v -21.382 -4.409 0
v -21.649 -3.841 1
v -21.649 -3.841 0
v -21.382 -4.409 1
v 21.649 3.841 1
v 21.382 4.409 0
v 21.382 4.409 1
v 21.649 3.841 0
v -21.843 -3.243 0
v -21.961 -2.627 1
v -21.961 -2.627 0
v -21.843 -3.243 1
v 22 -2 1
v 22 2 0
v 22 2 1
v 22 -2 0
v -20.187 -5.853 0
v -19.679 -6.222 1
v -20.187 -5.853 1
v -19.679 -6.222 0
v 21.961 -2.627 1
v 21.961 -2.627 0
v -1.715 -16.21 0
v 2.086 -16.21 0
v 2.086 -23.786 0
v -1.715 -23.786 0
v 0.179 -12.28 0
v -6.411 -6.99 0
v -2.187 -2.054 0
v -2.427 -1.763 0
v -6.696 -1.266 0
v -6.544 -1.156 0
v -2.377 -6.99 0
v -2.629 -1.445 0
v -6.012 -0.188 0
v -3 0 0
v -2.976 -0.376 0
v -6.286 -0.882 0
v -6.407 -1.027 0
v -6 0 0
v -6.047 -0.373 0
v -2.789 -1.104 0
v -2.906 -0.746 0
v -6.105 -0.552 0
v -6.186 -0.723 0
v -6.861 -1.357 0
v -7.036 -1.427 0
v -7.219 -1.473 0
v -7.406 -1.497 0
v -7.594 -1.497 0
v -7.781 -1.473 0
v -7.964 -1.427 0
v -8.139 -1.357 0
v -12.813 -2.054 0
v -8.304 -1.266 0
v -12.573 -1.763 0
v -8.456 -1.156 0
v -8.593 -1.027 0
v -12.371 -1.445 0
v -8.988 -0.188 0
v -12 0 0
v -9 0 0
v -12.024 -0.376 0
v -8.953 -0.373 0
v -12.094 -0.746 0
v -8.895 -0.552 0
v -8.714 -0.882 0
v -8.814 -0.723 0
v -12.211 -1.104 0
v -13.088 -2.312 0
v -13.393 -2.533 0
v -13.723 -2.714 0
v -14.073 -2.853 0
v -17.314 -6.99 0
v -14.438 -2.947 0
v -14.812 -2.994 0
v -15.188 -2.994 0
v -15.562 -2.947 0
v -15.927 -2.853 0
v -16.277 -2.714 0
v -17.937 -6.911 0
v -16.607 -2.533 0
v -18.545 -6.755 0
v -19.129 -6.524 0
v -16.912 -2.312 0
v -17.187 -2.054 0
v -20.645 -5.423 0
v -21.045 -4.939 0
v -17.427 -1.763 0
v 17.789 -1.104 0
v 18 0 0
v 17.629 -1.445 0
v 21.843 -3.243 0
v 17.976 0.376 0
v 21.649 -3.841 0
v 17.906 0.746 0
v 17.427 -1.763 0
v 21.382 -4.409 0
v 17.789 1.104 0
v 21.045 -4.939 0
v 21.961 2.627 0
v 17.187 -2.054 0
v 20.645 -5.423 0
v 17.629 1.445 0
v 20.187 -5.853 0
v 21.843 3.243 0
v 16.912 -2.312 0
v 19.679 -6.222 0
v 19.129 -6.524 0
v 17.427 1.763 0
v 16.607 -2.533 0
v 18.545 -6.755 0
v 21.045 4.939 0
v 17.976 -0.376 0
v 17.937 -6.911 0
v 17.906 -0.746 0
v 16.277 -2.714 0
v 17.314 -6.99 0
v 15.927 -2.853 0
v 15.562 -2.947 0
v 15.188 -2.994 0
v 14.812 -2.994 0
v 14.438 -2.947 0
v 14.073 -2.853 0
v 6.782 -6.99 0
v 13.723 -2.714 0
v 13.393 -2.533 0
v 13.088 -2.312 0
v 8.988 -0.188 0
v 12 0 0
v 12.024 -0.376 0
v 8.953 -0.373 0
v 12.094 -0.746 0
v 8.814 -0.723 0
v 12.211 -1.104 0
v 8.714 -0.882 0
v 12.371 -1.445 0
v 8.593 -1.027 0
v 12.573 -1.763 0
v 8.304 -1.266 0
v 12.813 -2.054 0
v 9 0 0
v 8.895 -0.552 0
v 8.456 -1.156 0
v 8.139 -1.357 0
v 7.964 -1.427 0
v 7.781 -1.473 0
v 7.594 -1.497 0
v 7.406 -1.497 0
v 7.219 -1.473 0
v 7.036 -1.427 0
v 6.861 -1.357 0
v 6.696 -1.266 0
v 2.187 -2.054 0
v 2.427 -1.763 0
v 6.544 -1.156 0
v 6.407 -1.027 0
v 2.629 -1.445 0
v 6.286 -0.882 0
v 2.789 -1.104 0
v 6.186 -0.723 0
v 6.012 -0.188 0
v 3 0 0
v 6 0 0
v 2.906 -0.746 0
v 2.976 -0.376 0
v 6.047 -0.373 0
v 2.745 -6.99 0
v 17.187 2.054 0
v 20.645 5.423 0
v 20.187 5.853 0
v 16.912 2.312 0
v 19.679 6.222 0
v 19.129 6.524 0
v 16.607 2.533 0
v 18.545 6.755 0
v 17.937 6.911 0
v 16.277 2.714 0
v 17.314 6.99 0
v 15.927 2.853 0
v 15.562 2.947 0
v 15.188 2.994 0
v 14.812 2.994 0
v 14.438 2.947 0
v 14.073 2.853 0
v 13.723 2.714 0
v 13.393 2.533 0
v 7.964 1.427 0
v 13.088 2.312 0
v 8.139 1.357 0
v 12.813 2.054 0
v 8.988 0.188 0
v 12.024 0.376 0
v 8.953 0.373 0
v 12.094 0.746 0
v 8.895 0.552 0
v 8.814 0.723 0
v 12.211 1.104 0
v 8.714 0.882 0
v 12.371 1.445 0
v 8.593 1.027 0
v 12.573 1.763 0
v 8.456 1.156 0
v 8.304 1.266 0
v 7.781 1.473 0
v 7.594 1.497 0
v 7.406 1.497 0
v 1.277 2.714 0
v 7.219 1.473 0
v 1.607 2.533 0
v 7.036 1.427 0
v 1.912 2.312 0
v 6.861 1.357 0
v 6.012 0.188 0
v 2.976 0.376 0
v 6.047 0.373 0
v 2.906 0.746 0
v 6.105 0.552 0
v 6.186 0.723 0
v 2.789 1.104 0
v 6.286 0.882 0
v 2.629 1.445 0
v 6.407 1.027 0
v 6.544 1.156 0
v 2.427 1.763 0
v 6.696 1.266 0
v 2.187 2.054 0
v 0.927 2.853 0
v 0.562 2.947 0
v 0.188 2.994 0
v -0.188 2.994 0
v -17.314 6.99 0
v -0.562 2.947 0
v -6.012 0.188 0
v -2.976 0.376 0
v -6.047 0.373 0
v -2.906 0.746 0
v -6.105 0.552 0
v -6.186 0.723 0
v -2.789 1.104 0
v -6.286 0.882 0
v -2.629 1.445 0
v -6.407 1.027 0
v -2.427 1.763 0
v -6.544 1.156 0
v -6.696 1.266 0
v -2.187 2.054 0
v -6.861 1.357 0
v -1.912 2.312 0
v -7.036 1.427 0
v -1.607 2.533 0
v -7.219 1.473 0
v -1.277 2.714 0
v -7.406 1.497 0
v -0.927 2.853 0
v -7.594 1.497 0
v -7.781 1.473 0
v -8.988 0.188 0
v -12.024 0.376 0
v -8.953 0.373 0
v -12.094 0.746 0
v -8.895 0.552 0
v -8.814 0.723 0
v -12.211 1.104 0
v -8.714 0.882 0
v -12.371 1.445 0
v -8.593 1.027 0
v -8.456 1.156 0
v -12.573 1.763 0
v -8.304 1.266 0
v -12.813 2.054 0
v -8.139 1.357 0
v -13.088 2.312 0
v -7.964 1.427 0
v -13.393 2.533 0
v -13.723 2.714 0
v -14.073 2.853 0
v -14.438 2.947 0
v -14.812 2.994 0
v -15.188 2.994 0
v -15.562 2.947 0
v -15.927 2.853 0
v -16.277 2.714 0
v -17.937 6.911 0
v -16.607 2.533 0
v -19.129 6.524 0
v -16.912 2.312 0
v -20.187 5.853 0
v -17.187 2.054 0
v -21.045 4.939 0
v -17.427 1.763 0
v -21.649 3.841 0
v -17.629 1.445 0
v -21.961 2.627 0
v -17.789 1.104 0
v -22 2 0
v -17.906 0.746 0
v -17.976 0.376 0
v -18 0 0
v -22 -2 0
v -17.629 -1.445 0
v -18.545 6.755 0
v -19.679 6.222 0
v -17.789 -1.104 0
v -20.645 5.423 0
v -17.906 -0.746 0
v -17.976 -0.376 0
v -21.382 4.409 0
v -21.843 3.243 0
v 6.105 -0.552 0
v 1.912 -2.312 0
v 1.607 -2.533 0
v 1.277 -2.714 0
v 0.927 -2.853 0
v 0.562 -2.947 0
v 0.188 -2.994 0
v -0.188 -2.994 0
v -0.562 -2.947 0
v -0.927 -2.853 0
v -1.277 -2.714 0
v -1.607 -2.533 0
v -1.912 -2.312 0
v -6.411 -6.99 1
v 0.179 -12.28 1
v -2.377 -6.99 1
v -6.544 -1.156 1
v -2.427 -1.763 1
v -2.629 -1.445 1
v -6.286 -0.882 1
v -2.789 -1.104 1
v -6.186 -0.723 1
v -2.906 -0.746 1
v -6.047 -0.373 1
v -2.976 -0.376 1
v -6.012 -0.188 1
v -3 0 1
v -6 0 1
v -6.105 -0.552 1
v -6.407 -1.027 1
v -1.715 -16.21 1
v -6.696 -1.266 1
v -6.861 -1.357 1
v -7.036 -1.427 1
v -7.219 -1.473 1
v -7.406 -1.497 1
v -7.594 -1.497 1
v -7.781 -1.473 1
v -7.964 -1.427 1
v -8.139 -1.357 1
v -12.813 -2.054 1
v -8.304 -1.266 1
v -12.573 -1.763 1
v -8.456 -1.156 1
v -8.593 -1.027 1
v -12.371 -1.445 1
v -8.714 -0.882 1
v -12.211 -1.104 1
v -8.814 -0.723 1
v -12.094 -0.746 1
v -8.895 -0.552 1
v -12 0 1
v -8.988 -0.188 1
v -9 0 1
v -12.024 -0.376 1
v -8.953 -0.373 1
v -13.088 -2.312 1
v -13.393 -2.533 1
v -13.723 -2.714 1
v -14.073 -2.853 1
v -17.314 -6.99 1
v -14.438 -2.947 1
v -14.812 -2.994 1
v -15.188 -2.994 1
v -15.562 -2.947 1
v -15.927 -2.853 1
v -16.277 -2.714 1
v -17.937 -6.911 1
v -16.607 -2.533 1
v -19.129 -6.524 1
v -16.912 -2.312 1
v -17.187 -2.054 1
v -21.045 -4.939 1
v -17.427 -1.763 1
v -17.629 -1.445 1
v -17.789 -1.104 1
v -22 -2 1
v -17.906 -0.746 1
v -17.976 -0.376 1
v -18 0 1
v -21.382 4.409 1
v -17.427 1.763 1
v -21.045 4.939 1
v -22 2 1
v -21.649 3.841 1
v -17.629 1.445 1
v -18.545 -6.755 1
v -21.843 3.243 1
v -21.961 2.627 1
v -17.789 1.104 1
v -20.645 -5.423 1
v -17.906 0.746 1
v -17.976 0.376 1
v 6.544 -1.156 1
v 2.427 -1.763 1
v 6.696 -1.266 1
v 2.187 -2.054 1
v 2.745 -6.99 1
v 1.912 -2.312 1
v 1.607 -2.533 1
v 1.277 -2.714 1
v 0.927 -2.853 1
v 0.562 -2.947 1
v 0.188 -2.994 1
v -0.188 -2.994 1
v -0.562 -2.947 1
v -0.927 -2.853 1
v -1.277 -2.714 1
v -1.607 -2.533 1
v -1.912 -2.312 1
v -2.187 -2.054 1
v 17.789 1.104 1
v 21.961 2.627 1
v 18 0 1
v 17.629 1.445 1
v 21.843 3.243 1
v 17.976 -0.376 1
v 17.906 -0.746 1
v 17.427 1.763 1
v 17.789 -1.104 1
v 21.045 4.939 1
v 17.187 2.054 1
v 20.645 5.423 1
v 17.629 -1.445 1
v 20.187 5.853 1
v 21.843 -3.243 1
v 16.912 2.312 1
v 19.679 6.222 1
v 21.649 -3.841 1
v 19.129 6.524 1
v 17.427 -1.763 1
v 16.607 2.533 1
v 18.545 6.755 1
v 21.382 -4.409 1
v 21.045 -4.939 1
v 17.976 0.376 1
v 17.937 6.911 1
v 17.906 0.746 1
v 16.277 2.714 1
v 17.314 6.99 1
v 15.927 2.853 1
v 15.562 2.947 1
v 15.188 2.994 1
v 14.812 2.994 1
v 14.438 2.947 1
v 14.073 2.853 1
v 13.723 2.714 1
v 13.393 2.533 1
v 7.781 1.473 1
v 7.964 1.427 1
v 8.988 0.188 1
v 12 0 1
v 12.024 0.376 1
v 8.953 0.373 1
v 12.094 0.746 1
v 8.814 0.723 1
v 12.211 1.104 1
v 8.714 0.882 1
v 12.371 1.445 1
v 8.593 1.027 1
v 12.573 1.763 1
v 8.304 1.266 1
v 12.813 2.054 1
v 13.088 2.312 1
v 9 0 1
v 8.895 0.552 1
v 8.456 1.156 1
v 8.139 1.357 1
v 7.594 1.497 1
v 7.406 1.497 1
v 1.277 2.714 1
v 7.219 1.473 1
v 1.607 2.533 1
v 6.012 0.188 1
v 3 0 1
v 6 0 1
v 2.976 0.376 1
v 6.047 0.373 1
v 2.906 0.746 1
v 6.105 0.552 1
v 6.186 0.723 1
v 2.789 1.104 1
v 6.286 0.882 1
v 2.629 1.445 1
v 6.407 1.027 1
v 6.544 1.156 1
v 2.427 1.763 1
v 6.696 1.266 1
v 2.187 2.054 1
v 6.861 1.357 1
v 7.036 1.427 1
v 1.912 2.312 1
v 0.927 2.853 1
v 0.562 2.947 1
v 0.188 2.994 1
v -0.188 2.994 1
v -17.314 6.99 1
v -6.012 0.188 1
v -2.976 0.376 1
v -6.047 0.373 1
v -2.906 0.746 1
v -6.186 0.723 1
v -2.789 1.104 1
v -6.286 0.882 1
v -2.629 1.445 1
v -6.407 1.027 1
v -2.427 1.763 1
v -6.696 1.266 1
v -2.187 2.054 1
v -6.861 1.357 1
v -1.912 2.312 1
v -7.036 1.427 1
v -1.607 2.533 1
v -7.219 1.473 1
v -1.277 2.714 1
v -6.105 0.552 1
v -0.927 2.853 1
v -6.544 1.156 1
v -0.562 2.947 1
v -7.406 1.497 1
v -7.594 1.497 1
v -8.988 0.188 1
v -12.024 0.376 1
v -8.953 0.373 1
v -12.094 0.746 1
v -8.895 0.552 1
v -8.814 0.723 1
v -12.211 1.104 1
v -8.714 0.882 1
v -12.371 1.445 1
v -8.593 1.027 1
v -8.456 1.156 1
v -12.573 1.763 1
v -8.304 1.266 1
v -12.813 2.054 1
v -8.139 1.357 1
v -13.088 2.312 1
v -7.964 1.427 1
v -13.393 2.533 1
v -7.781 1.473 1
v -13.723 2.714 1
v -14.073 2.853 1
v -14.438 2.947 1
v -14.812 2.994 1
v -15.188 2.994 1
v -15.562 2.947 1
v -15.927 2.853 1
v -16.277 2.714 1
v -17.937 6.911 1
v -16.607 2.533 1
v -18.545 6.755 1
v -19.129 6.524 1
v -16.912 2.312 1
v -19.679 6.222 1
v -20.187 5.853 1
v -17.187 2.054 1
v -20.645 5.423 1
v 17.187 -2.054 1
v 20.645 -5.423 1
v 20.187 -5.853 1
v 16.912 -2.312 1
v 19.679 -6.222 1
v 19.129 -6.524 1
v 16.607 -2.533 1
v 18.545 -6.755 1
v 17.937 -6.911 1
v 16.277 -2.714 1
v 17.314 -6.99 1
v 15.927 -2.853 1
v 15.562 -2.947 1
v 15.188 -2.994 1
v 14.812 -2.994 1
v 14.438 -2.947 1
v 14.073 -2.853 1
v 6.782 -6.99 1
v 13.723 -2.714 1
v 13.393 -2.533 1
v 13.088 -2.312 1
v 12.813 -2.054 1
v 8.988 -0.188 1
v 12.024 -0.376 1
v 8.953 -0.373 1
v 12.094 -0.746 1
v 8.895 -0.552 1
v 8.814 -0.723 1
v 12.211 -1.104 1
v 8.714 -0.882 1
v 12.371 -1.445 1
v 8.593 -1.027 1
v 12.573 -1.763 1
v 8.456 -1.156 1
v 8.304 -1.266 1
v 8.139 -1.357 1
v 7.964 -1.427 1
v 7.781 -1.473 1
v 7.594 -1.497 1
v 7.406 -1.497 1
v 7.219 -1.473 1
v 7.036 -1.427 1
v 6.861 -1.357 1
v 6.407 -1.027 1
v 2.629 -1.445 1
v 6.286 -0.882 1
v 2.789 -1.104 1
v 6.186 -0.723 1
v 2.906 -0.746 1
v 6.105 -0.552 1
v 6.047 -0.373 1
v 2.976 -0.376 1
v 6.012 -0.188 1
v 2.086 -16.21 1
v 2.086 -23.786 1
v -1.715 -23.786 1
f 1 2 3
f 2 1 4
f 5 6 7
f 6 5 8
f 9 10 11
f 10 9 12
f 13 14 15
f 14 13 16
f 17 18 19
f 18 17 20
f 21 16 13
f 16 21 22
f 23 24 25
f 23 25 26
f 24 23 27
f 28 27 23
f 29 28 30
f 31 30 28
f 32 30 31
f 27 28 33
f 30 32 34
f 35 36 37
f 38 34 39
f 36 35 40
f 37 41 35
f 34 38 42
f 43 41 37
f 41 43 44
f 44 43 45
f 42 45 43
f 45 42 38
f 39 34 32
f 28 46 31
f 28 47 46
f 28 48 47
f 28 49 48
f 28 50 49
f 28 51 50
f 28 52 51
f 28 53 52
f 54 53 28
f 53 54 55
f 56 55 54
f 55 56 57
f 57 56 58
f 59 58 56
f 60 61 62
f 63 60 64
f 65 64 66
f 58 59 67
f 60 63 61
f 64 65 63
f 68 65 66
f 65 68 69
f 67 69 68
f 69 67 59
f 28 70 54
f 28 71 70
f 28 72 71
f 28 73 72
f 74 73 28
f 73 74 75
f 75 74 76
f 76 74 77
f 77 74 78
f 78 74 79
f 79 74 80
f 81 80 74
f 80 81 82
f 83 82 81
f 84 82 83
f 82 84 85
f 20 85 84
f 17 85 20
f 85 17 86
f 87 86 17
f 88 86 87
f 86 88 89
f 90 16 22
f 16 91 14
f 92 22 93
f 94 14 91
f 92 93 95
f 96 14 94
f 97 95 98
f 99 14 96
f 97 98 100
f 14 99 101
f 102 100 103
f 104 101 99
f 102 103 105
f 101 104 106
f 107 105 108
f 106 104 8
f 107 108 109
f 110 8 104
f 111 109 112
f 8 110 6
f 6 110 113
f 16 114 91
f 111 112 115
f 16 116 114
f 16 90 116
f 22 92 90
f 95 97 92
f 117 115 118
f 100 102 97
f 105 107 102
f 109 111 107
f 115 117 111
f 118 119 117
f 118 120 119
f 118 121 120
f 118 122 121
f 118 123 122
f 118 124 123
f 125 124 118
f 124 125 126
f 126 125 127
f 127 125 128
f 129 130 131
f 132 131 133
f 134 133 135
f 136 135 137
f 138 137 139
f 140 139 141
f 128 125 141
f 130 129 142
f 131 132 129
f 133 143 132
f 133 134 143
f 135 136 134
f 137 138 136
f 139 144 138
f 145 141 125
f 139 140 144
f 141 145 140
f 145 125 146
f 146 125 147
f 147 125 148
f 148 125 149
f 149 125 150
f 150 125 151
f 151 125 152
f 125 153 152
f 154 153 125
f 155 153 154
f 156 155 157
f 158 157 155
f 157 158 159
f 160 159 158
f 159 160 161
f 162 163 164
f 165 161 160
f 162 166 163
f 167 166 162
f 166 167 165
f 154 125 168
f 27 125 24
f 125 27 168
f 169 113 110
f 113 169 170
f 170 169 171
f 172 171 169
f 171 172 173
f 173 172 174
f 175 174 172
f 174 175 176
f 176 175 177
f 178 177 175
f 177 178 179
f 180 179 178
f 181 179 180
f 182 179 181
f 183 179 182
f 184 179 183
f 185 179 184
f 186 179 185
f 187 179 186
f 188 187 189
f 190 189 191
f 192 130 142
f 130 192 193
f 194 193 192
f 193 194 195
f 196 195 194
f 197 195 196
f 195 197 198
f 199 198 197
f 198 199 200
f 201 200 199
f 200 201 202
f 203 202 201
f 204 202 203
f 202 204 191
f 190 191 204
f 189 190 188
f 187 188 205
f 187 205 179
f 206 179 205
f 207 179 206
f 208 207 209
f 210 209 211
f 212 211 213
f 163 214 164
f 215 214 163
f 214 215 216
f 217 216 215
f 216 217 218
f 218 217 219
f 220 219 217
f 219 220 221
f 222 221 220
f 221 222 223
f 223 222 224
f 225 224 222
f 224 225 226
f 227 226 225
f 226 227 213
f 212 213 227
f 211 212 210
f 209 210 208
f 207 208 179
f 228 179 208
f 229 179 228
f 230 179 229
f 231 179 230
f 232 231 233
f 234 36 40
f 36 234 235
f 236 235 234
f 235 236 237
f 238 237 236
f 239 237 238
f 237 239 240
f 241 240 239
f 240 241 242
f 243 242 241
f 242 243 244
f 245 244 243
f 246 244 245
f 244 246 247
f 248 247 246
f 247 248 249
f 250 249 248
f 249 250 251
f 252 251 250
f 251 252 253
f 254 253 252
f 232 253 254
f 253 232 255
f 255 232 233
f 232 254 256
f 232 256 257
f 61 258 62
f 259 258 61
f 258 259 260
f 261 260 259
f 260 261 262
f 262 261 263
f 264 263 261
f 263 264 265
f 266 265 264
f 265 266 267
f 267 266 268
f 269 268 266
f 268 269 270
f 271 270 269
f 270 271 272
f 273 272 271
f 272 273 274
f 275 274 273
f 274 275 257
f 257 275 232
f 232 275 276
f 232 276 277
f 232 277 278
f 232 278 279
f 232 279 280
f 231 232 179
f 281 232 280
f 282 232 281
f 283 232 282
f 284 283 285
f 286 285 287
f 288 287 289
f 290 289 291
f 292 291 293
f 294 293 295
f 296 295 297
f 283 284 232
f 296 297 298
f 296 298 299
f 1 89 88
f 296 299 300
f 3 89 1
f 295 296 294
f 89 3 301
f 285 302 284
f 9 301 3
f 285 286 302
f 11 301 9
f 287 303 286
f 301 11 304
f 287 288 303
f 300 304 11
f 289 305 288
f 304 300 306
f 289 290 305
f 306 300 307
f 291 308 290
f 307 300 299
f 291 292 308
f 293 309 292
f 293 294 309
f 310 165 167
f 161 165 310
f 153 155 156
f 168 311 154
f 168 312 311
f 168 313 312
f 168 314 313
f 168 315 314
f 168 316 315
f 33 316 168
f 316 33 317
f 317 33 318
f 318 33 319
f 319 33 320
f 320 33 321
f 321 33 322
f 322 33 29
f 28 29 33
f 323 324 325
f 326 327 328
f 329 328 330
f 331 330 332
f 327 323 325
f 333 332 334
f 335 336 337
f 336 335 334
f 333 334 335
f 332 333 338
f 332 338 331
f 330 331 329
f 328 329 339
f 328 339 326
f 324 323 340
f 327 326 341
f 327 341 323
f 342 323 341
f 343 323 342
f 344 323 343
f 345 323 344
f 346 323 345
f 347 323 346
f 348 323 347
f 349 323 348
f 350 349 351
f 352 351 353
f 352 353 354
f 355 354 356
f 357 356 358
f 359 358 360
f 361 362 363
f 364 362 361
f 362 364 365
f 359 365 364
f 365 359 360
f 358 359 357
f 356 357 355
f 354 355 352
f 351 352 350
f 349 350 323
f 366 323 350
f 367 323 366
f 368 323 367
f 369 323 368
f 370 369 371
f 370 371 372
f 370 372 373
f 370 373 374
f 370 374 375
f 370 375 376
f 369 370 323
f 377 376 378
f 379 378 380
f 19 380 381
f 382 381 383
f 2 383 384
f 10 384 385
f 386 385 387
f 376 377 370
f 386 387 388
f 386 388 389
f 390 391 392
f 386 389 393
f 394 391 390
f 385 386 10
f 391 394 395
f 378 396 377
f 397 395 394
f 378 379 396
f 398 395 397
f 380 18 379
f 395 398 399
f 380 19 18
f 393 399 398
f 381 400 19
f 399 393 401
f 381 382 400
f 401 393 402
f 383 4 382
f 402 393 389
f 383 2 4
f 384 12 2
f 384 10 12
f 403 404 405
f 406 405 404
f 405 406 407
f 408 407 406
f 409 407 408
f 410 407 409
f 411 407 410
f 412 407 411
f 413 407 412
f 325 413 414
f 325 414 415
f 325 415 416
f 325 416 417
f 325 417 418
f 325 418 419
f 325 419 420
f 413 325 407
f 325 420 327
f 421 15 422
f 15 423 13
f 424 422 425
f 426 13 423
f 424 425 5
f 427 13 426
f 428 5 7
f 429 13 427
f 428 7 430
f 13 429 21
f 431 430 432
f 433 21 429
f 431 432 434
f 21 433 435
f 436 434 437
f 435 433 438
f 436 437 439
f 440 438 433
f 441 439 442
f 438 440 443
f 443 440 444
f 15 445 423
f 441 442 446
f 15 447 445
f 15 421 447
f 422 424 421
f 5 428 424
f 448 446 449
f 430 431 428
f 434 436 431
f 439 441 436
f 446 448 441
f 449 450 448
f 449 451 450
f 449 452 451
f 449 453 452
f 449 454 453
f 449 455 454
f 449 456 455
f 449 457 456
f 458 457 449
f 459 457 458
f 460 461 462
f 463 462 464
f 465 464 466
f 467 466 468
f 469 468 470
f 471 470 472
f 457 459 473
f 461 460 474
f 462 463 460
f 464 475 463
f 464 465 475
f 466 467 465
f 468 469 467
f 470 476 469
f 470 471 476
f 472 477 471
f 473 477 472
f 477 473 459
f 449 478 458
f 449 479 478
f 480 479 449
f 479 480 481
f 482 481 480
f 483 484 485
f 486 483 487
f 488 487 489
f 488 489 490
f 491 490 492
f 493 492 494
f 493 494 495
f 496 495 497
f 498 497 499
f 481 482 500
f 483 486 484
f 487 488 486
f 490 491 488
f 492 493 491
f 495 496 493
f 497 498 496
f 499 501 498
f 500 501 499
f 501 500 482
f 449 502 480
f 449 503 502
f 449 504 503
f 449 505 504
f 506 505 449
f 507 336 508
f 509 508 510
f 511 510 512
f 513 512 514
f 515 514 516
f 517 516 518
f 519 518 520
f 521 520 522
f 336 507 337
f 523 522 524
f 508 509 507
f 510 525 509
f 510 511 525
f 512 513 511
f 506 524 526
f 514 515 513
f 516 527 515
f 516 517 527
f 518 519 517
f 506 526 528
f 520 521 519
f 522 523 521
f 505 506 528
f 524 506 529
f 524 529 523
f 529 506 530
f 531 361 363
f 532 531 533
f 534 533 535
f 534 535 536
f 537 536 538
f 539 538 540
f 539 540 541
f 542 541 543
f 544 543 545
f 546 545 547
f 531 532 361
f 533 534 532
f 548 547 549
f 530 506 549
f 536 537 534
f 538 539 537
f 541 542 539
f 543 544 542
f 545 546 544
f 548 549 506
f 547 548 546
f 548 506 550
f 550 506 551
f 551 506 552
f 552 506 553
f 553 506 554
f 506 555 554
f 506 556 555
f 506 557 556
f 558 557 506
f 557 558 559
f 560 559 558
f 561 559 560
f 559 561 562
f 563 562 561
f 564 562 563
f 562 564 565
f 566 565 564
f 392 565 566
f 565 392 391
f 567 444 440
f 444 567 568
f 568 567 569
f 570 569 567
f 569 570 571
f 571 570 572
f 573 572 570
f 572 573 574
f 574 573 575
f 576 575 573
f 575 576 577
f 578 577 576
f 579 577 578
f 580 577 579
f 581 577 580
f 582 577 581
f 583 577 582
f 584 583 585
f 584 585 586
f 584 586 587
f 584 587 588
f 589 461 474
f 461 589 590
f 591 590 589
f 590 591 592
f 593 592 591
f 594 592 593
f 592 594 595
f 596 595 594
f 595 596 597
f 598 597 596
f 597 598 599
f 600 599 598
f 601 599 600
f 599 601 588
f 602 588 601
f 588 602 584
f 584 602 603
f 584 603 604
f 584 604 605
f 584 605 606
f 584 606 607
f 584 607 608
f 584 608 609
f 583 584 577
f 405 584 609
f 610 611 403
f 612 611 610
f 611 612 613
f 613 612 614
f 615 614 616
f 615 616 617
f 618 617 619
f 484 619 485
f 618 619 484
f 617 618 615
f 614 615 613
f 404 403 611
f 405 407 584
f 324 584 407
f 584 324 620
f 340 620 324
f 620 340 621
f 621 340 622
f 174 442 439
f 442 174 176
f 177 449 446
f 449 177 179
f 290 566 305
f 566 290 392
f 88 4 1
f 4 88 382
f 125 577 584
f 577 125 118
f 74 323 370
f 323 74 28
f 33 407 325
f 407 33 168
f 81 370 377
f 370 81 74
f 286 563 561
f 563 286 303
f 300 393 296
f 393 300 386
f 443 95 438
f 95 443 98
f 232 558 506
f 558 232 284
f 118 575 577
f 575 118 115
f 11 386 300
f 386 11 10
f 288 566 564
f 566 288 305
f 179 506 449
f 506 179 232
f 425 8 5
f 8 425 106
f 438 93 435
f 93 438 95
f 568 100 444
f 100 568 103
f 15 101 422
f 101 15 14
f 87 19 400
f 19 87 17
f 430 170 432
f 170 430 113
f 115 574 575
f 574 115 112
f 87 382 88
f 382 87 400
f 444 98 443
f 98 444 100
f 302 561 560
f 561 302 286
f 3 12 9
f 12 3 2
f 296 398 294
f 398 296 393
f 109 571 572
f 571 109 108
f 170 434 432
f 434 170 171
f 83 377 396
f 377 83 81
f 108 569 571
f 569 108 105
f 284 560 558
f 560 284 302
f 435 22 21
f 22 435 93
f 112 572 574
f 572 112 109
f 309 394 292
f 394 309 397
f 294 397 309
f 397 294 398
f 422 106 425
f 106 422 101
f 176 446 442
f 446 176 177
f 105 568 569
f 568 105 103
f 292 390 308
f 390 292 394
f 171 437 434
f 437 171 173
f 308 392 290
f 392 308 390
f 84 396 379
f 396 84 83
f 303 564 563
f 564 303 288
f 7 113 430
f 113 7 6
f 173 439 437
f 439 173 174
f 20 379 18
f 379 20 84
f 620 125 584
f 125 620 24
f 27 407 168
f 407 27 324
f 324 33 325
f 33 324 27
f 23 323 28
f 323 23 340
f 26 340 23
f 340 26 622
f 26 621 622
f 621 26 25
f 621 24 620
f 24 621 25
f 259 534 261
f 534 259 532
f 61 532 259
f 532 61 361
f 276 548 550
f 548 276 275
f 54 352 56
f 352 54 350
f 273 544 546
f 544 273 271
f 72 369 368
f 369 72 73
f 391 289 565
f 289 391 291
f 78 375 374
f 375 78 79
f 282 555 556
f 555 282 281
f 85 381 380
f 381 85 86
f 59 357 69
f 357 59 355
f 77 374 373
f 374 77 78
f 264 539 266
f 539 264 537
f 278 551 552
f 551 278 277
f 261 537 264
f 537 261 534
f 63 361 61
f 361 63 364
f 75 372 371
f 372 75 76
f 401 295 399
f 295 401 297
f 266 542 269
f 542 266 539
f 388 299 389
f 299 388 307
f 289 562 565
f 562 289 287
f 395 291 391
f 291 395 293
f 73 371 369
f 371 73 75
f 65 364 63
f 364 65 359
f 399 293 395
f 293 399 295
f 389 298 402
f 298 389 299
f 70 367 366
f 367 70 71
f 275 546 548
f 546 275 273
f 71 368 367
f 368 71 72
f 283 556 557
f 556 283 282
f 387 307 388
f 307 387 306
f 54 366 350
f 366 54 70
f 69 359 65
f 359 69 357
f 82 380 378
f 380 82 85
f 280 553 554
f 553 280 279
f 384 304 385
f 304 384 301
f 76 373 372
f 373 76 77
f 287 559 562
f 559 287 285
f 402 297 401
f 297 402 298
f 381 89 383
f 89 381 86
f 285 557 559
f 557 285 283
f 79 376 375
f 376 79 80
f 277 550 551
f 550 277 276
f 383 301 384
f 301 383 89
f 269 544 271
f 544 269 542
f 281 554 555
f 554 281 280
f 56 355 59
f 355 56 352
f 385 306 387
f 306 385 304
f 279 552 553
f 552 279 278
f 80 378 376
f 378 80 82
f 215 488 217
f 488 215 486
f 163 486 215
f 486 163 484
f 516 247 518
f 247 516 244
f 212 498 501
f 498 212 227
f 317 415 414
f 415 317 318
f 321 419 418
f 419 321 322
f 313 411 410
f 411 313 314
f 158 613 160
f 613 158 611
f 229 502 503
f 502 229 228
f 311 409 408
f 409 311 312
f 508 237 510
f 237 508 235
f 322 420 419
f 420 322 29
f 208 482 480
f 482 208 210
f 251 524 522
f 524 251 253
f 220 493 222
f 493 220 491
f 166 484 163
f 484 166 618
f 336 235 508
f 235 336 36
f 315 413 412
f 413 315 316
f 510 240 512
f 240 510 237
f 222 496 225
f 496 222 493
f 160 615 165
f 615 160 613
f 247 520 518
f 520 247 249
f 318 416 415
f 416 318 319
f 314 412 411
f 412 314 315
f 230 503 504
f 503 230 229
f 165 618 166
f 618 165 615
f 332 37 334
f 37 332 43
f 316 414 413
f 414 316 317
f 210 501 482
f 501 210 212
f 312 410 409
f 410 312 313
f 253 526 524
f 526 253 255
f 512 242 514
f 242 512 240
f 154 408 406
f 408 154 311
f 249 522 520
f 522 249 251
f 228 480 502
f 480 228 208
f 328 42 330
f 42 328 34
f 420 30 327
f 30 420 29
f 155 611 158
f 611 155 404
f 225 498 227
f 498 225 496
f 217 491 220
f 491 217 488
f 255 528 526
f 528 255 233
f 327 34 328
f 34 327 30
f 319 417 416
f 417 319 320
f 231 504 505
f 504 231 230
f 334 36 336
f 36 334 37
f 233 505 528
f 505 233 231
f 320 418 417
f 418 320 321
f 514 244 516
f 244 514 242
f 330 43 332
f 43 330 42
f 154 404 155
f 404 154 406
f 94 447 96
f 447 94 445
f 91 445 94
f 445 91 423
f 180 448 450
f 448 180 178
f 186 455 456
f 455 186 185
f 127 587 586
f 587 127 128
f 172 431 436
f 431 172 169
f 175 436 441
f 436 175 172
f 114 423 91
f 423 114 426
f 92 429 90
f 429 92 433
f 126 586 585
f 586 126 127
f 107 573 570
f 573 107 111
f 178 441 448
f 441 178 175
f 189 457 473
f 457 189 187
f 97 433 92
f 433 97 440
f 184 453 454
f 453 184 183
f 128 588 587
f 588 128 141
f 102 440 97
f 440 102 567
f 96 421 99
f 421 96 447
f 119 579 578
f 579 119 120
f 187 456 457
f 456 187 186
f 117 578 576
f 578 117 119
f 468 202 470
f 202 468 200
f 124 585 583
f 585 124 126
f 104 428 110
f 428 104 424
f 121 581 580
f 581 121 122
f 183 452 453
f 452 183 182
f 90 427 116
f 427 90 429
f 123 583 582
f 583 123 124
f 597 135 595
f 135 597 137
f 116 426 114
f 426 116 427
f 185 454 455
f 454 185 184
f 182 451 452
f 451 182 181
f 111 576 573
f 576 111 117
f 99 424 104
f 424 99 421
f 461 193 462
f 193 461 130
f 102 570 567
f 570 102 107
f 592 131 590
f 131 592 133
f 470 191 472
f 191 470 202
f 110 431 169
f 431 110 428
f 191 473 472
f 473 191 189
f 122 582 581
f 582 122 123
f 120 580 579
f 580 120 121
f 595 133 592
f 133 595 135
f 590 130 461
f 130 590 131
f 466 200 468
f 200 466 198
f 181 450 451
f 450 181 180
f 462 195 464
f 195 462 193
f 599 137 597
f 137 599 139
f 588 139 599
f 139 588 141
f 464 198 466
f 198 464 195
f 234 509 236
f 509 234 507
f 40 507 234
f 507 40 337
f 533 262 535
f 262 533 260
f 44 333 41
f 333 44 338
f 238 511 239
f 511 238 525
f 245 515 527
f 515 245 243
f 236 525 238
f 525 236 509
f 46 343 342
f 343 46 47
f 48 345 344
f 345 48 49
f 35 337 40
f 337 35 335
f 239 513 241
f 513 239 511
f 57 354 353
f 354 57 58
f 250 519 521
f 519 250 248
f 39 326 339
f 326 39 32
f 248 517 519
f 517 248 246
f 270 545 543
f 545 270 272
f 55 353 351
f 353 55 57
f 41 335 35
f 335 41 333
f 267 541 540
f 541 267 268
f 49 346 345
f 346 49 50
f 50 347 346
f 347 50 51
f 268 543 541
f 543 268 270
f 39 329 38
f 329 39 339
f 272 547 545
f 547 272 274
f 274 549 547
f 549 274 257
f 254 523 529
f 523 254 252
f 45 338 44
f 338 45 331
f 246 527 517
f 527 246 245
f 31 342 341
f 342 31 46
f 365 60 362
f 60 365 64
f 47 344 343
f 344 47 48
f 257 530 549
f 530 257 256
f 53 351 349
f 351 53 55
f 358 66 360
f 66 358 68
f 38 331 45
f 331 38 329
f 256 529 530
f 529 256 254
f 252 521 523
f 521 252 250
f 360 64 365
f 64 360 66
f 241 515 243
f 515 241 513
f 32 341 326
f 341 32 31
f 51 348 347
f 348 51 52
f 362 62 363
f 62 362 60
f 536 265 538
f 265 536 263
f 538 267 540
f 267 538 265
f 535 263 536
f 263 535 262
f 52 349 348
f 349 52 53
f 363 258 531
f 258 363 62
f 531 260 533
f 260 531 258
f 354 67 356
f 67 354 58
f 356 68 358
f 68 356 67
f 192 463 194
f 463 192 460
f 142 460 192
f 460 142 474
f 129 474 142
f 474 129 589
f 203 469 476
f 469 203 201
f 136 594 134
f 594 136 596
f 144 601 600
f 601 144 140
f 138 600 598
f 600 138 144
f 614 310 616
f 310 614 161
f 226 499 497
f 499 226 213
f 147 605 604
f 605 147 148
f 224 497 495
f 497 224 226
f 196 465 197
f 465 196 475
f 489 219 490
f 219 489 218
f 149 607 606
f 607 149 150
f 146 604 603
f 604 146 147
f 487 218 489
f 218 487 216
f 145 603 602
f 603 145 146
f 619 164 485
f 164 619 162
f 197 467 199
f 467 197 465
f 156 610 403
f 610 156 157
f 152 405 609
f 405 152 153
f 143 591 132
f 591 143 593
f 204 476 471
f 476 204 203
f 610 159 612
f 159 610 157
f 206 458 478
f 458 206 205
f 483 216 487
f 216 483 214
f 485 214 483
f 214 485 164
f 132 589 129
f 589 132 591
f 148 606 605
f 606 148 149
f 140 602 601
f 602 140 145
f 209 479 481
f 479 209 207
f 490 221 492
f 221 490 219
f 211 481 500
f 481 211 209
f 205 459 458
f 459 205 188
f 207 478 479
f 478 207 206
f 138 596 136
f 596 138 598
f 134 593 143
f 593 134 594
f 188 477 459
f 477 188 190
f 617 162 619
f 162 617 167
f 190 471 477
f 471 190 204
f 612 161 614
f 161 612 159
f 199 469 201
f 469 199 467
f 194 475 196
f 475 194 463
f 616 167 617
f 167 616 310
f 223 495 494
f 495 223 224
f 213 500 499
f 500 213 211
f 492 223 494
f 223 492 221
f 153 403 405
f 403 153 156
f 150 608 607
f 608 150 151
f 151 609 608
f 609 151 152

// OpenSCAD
$fn = 50;


difference() {
	union() {
		hull() {
			translate(v = [-17.0000000000, 2.0000000000, 0]) {
				cylinder(h = 1, r = 5);
			}
			translate(v = [17.0000000000, 2.0000000000, 0]) {
				cylinder(h = 1, r = 5);
			}
			translate(v = [-17.0000000000, -2.0000000000, 0]) {
				cylinder(h = 1, r = 5);
			}
			translate(v = [17.0000000000, -2.0000000000, 0]) {
				cylinder(h = 1, r = 5);
			}
		}
		translate(v = [0, -5, 0]) {
			linear_extrude(height = 1) {
				text(font = "DejaVu Sans Mono:style=Bold", halign = "center", size = 19.0000000000, text = "Y", valign = "top");
			}
		}
	}
	union() {
		translate(v = [-15.0000000000, 0.0000000000, 0]) {
			translate(v = [0, 0, -100]) {
				cylinder(h = 200, r = 3.0000000000);
			}
		}
		translate(v = [0, 0, -100]) {
			cylinder(h = 200, r = 3.0000000000);
		}
		translate(v = [15.0000000000, 0.0000000000, 0]) {
			translate(v = [0, 0, -100]) {
				cylinder(h = 200, r = 3.0000000000);
			}
		}
		translate(v = [-15.0000000000, 0.0000000000, 0]) {
			translate(v = [0, 0, -100]) {
				cylinder(h = 200, r = 1.5000000000);
			}
		}
		translate(v = [-7.5000000000, 0.0000000000, 0]) {
			translate(v = [0, 0, -100]) {
				cylinder(h = 200, r = 1.5000000000);
			}
		}
		translate(v = [0, 0, -100]) {
			cylinder(h = 200, r = 1.5000000000);
		}
		translate(v = [7.5000000000, 0.0000000000, 0]) {
			translate(v = [0, 0, -100]) {
				cylinder(h = 200, r = 1.5000000000);
			}
		}
		translate(v = [15.0000000000, 0.0000000000, 0]) {
			translate(v = [0, 0, -100]) {
				cylinder(h = 200, r = 1.5000000000);
			}
		}
	}
}
